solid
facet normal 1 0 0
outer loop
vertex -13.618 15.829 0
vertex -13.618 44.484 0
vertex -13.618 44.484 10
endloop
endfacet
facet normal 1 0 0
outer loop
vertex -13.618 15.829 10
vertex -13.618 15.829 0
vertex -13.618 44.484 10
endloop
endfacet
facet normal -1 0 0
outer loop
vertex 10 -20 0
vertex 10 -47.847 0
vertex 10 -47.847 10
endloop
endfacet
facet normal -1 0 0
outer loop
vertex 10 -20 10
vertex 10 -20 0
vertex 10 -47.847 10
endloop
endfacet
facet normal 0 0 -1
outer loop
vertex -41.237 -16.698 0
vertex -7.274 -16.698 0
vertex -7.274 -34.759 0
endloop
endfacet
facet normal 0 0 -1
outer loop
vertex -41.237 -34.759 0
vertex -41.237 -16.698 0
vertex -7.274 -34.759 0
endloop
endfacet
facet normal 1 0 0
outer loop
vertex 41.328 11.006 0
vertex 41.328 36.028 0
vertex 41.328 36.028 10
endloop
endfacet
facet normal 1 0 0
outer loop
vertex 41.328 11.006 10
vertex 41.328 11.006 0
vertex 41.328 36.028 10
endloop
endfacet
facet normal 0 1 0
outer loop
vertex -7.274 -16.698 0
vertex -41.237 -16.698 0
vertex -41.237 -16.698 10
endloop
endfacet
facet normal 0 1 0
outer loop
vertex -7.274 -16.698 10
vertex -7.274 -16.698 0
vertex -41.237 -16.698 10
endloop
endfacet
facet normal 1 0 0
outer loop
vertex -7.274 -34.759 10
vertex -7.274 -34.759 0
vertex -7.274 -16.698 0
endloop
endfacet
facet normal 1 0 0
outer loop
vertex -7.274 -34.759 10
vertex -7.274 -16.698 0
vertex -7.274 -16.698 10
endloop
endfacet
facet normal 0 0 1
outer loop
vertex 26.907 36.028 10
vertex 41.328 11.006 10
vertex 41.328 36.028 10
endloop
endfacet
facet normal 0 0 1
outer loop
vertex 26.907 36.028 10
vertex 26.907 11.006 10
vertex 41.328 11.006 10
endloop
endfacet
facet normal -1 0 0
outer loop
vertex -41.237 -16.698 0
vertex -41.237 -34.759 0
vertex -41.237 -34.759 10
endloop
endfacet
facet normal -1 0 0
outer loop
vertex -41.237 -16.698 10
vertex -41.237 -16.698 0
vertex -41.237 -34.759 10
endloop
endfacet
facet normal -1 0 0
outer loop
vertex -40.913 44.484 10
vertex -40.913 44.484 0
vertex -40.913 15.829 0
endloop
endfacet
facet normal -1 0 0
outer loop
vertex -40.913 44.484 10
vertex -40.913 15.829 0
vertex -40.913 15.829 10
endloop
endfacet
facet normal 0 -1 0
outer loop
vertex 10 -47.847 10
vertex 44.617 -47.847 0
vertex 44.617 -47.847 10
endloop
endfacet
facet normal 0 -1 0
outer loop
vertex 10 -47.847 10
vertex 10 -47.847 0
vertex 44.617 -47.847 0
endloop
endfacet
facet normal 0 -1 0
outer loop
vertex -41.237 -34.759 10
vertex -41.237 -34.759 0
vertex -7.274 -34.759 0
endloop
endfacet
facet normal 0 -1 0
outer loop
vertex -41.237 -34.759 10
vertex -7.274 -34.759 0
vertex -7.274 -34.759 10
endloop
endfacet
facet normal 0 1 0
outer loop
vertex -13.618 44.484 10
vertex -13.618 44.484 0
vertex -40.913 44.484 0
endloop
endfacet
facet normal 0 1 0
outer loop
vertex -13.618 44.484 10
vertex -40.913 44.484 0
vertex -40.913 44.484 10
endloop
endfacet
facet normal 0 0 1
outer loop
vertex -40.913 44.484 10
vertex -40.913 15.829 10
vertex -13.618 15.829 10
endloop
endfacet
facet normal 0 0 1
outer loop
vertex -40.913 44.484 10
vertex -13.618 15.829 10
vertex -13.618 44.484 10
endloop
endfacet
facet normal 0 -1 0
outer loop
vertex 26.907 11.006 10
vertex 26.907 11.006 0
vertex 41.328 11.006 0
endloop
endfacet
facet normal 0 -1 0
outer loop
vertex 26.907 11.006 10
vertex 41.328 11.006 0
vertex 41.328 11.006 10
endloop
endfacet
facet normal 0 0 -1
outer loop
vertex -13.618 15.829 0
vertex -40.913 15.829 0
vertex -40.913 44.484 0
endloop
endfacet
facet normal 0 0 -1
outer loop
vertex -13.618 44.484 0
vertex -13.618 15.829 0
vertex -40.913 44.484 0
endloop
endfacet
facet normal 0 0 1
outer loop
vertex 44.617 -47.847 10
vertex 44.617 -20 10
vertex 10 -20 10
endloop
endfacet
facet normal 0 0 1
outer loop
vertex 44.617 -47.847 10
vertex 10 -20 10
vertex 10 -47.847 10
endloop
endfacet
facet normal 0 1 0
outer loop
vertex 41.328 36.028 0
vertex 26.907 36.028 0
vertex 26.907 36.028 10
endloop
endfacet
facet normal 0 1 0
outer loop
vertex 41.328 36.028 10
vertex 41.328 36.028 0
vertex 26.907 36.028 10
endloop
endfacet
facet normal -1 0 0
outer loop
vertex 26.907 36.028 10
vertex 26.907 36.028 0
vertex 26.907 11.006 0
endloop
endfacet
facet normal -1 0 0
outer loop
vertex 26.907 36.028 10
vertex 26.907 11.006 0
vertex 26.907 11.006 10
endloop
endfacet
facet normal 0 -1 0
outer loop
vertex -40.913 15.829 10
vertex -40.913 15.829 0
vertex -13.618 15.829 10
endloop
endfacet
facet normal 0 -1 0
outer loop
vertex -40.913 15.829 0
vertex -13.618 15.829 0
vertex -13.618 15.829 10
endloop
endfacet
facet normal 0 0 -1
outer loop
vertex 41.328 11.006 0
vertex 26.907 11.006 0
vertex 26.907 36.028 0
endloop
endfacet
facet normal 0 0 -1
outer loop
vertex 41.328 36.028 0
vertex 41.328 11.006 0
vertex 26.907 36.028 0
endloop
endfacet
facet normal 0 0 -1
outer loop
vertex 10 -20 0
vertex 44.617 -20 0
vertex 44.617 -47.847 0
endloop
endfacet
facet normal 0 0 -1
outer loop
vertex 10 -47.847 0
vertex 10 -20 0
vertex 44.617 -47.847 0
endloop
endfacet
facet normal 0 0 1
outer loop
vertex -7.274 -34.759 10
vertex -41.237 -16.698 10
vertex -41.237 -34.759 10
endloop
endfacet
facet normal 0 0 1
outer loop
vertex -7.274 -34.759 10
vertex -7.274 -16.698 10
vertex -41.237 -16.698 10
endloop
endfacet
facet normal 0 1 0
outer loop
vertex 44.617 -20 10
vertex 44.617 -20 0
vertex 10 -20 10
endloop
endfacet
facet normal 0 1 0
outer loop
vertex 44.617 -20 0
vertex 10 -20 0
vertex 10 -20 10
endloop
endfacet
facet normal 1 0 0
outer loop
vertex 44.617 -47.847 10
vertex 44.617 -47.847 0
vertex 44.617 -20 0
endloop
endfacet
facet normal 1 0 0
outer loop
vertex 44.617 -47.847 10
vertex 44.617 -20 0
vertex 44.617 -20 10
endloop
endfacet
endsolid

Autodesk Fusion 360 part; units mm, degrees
box "BoxPrimitive1" add length 25.0221 width 14.4211 height 10 placed x (0, 1, 0) y (-1, 0, 0) z (0, 0, 1) at (41.3283, 11.0058, 0) makes body 1
box "BoxPrimitive2" add length 28.6549 width 27.2948 height 10 placed x (0, 1, 0) y (-1, 0, 0) z (0, 0, 1) at (-13.6185, 15.8287, 0) separate body makes body 2
box "BoxPrimitive3" add length 18.0613 width 33.9628 height 10 placed x (0, -1, 0) y (1, 0, 0) z (0, 0, 1) at (-41.2372, -16.6975, 0) separate body makes body 3
box "BoxPrimitive4" add length 27.8473 width 34.617 height 10 placed x (0, -1, 0) y (1, 0, 0) z (0, 0, 1) at (10, -20, 0) separate body makes body 4
